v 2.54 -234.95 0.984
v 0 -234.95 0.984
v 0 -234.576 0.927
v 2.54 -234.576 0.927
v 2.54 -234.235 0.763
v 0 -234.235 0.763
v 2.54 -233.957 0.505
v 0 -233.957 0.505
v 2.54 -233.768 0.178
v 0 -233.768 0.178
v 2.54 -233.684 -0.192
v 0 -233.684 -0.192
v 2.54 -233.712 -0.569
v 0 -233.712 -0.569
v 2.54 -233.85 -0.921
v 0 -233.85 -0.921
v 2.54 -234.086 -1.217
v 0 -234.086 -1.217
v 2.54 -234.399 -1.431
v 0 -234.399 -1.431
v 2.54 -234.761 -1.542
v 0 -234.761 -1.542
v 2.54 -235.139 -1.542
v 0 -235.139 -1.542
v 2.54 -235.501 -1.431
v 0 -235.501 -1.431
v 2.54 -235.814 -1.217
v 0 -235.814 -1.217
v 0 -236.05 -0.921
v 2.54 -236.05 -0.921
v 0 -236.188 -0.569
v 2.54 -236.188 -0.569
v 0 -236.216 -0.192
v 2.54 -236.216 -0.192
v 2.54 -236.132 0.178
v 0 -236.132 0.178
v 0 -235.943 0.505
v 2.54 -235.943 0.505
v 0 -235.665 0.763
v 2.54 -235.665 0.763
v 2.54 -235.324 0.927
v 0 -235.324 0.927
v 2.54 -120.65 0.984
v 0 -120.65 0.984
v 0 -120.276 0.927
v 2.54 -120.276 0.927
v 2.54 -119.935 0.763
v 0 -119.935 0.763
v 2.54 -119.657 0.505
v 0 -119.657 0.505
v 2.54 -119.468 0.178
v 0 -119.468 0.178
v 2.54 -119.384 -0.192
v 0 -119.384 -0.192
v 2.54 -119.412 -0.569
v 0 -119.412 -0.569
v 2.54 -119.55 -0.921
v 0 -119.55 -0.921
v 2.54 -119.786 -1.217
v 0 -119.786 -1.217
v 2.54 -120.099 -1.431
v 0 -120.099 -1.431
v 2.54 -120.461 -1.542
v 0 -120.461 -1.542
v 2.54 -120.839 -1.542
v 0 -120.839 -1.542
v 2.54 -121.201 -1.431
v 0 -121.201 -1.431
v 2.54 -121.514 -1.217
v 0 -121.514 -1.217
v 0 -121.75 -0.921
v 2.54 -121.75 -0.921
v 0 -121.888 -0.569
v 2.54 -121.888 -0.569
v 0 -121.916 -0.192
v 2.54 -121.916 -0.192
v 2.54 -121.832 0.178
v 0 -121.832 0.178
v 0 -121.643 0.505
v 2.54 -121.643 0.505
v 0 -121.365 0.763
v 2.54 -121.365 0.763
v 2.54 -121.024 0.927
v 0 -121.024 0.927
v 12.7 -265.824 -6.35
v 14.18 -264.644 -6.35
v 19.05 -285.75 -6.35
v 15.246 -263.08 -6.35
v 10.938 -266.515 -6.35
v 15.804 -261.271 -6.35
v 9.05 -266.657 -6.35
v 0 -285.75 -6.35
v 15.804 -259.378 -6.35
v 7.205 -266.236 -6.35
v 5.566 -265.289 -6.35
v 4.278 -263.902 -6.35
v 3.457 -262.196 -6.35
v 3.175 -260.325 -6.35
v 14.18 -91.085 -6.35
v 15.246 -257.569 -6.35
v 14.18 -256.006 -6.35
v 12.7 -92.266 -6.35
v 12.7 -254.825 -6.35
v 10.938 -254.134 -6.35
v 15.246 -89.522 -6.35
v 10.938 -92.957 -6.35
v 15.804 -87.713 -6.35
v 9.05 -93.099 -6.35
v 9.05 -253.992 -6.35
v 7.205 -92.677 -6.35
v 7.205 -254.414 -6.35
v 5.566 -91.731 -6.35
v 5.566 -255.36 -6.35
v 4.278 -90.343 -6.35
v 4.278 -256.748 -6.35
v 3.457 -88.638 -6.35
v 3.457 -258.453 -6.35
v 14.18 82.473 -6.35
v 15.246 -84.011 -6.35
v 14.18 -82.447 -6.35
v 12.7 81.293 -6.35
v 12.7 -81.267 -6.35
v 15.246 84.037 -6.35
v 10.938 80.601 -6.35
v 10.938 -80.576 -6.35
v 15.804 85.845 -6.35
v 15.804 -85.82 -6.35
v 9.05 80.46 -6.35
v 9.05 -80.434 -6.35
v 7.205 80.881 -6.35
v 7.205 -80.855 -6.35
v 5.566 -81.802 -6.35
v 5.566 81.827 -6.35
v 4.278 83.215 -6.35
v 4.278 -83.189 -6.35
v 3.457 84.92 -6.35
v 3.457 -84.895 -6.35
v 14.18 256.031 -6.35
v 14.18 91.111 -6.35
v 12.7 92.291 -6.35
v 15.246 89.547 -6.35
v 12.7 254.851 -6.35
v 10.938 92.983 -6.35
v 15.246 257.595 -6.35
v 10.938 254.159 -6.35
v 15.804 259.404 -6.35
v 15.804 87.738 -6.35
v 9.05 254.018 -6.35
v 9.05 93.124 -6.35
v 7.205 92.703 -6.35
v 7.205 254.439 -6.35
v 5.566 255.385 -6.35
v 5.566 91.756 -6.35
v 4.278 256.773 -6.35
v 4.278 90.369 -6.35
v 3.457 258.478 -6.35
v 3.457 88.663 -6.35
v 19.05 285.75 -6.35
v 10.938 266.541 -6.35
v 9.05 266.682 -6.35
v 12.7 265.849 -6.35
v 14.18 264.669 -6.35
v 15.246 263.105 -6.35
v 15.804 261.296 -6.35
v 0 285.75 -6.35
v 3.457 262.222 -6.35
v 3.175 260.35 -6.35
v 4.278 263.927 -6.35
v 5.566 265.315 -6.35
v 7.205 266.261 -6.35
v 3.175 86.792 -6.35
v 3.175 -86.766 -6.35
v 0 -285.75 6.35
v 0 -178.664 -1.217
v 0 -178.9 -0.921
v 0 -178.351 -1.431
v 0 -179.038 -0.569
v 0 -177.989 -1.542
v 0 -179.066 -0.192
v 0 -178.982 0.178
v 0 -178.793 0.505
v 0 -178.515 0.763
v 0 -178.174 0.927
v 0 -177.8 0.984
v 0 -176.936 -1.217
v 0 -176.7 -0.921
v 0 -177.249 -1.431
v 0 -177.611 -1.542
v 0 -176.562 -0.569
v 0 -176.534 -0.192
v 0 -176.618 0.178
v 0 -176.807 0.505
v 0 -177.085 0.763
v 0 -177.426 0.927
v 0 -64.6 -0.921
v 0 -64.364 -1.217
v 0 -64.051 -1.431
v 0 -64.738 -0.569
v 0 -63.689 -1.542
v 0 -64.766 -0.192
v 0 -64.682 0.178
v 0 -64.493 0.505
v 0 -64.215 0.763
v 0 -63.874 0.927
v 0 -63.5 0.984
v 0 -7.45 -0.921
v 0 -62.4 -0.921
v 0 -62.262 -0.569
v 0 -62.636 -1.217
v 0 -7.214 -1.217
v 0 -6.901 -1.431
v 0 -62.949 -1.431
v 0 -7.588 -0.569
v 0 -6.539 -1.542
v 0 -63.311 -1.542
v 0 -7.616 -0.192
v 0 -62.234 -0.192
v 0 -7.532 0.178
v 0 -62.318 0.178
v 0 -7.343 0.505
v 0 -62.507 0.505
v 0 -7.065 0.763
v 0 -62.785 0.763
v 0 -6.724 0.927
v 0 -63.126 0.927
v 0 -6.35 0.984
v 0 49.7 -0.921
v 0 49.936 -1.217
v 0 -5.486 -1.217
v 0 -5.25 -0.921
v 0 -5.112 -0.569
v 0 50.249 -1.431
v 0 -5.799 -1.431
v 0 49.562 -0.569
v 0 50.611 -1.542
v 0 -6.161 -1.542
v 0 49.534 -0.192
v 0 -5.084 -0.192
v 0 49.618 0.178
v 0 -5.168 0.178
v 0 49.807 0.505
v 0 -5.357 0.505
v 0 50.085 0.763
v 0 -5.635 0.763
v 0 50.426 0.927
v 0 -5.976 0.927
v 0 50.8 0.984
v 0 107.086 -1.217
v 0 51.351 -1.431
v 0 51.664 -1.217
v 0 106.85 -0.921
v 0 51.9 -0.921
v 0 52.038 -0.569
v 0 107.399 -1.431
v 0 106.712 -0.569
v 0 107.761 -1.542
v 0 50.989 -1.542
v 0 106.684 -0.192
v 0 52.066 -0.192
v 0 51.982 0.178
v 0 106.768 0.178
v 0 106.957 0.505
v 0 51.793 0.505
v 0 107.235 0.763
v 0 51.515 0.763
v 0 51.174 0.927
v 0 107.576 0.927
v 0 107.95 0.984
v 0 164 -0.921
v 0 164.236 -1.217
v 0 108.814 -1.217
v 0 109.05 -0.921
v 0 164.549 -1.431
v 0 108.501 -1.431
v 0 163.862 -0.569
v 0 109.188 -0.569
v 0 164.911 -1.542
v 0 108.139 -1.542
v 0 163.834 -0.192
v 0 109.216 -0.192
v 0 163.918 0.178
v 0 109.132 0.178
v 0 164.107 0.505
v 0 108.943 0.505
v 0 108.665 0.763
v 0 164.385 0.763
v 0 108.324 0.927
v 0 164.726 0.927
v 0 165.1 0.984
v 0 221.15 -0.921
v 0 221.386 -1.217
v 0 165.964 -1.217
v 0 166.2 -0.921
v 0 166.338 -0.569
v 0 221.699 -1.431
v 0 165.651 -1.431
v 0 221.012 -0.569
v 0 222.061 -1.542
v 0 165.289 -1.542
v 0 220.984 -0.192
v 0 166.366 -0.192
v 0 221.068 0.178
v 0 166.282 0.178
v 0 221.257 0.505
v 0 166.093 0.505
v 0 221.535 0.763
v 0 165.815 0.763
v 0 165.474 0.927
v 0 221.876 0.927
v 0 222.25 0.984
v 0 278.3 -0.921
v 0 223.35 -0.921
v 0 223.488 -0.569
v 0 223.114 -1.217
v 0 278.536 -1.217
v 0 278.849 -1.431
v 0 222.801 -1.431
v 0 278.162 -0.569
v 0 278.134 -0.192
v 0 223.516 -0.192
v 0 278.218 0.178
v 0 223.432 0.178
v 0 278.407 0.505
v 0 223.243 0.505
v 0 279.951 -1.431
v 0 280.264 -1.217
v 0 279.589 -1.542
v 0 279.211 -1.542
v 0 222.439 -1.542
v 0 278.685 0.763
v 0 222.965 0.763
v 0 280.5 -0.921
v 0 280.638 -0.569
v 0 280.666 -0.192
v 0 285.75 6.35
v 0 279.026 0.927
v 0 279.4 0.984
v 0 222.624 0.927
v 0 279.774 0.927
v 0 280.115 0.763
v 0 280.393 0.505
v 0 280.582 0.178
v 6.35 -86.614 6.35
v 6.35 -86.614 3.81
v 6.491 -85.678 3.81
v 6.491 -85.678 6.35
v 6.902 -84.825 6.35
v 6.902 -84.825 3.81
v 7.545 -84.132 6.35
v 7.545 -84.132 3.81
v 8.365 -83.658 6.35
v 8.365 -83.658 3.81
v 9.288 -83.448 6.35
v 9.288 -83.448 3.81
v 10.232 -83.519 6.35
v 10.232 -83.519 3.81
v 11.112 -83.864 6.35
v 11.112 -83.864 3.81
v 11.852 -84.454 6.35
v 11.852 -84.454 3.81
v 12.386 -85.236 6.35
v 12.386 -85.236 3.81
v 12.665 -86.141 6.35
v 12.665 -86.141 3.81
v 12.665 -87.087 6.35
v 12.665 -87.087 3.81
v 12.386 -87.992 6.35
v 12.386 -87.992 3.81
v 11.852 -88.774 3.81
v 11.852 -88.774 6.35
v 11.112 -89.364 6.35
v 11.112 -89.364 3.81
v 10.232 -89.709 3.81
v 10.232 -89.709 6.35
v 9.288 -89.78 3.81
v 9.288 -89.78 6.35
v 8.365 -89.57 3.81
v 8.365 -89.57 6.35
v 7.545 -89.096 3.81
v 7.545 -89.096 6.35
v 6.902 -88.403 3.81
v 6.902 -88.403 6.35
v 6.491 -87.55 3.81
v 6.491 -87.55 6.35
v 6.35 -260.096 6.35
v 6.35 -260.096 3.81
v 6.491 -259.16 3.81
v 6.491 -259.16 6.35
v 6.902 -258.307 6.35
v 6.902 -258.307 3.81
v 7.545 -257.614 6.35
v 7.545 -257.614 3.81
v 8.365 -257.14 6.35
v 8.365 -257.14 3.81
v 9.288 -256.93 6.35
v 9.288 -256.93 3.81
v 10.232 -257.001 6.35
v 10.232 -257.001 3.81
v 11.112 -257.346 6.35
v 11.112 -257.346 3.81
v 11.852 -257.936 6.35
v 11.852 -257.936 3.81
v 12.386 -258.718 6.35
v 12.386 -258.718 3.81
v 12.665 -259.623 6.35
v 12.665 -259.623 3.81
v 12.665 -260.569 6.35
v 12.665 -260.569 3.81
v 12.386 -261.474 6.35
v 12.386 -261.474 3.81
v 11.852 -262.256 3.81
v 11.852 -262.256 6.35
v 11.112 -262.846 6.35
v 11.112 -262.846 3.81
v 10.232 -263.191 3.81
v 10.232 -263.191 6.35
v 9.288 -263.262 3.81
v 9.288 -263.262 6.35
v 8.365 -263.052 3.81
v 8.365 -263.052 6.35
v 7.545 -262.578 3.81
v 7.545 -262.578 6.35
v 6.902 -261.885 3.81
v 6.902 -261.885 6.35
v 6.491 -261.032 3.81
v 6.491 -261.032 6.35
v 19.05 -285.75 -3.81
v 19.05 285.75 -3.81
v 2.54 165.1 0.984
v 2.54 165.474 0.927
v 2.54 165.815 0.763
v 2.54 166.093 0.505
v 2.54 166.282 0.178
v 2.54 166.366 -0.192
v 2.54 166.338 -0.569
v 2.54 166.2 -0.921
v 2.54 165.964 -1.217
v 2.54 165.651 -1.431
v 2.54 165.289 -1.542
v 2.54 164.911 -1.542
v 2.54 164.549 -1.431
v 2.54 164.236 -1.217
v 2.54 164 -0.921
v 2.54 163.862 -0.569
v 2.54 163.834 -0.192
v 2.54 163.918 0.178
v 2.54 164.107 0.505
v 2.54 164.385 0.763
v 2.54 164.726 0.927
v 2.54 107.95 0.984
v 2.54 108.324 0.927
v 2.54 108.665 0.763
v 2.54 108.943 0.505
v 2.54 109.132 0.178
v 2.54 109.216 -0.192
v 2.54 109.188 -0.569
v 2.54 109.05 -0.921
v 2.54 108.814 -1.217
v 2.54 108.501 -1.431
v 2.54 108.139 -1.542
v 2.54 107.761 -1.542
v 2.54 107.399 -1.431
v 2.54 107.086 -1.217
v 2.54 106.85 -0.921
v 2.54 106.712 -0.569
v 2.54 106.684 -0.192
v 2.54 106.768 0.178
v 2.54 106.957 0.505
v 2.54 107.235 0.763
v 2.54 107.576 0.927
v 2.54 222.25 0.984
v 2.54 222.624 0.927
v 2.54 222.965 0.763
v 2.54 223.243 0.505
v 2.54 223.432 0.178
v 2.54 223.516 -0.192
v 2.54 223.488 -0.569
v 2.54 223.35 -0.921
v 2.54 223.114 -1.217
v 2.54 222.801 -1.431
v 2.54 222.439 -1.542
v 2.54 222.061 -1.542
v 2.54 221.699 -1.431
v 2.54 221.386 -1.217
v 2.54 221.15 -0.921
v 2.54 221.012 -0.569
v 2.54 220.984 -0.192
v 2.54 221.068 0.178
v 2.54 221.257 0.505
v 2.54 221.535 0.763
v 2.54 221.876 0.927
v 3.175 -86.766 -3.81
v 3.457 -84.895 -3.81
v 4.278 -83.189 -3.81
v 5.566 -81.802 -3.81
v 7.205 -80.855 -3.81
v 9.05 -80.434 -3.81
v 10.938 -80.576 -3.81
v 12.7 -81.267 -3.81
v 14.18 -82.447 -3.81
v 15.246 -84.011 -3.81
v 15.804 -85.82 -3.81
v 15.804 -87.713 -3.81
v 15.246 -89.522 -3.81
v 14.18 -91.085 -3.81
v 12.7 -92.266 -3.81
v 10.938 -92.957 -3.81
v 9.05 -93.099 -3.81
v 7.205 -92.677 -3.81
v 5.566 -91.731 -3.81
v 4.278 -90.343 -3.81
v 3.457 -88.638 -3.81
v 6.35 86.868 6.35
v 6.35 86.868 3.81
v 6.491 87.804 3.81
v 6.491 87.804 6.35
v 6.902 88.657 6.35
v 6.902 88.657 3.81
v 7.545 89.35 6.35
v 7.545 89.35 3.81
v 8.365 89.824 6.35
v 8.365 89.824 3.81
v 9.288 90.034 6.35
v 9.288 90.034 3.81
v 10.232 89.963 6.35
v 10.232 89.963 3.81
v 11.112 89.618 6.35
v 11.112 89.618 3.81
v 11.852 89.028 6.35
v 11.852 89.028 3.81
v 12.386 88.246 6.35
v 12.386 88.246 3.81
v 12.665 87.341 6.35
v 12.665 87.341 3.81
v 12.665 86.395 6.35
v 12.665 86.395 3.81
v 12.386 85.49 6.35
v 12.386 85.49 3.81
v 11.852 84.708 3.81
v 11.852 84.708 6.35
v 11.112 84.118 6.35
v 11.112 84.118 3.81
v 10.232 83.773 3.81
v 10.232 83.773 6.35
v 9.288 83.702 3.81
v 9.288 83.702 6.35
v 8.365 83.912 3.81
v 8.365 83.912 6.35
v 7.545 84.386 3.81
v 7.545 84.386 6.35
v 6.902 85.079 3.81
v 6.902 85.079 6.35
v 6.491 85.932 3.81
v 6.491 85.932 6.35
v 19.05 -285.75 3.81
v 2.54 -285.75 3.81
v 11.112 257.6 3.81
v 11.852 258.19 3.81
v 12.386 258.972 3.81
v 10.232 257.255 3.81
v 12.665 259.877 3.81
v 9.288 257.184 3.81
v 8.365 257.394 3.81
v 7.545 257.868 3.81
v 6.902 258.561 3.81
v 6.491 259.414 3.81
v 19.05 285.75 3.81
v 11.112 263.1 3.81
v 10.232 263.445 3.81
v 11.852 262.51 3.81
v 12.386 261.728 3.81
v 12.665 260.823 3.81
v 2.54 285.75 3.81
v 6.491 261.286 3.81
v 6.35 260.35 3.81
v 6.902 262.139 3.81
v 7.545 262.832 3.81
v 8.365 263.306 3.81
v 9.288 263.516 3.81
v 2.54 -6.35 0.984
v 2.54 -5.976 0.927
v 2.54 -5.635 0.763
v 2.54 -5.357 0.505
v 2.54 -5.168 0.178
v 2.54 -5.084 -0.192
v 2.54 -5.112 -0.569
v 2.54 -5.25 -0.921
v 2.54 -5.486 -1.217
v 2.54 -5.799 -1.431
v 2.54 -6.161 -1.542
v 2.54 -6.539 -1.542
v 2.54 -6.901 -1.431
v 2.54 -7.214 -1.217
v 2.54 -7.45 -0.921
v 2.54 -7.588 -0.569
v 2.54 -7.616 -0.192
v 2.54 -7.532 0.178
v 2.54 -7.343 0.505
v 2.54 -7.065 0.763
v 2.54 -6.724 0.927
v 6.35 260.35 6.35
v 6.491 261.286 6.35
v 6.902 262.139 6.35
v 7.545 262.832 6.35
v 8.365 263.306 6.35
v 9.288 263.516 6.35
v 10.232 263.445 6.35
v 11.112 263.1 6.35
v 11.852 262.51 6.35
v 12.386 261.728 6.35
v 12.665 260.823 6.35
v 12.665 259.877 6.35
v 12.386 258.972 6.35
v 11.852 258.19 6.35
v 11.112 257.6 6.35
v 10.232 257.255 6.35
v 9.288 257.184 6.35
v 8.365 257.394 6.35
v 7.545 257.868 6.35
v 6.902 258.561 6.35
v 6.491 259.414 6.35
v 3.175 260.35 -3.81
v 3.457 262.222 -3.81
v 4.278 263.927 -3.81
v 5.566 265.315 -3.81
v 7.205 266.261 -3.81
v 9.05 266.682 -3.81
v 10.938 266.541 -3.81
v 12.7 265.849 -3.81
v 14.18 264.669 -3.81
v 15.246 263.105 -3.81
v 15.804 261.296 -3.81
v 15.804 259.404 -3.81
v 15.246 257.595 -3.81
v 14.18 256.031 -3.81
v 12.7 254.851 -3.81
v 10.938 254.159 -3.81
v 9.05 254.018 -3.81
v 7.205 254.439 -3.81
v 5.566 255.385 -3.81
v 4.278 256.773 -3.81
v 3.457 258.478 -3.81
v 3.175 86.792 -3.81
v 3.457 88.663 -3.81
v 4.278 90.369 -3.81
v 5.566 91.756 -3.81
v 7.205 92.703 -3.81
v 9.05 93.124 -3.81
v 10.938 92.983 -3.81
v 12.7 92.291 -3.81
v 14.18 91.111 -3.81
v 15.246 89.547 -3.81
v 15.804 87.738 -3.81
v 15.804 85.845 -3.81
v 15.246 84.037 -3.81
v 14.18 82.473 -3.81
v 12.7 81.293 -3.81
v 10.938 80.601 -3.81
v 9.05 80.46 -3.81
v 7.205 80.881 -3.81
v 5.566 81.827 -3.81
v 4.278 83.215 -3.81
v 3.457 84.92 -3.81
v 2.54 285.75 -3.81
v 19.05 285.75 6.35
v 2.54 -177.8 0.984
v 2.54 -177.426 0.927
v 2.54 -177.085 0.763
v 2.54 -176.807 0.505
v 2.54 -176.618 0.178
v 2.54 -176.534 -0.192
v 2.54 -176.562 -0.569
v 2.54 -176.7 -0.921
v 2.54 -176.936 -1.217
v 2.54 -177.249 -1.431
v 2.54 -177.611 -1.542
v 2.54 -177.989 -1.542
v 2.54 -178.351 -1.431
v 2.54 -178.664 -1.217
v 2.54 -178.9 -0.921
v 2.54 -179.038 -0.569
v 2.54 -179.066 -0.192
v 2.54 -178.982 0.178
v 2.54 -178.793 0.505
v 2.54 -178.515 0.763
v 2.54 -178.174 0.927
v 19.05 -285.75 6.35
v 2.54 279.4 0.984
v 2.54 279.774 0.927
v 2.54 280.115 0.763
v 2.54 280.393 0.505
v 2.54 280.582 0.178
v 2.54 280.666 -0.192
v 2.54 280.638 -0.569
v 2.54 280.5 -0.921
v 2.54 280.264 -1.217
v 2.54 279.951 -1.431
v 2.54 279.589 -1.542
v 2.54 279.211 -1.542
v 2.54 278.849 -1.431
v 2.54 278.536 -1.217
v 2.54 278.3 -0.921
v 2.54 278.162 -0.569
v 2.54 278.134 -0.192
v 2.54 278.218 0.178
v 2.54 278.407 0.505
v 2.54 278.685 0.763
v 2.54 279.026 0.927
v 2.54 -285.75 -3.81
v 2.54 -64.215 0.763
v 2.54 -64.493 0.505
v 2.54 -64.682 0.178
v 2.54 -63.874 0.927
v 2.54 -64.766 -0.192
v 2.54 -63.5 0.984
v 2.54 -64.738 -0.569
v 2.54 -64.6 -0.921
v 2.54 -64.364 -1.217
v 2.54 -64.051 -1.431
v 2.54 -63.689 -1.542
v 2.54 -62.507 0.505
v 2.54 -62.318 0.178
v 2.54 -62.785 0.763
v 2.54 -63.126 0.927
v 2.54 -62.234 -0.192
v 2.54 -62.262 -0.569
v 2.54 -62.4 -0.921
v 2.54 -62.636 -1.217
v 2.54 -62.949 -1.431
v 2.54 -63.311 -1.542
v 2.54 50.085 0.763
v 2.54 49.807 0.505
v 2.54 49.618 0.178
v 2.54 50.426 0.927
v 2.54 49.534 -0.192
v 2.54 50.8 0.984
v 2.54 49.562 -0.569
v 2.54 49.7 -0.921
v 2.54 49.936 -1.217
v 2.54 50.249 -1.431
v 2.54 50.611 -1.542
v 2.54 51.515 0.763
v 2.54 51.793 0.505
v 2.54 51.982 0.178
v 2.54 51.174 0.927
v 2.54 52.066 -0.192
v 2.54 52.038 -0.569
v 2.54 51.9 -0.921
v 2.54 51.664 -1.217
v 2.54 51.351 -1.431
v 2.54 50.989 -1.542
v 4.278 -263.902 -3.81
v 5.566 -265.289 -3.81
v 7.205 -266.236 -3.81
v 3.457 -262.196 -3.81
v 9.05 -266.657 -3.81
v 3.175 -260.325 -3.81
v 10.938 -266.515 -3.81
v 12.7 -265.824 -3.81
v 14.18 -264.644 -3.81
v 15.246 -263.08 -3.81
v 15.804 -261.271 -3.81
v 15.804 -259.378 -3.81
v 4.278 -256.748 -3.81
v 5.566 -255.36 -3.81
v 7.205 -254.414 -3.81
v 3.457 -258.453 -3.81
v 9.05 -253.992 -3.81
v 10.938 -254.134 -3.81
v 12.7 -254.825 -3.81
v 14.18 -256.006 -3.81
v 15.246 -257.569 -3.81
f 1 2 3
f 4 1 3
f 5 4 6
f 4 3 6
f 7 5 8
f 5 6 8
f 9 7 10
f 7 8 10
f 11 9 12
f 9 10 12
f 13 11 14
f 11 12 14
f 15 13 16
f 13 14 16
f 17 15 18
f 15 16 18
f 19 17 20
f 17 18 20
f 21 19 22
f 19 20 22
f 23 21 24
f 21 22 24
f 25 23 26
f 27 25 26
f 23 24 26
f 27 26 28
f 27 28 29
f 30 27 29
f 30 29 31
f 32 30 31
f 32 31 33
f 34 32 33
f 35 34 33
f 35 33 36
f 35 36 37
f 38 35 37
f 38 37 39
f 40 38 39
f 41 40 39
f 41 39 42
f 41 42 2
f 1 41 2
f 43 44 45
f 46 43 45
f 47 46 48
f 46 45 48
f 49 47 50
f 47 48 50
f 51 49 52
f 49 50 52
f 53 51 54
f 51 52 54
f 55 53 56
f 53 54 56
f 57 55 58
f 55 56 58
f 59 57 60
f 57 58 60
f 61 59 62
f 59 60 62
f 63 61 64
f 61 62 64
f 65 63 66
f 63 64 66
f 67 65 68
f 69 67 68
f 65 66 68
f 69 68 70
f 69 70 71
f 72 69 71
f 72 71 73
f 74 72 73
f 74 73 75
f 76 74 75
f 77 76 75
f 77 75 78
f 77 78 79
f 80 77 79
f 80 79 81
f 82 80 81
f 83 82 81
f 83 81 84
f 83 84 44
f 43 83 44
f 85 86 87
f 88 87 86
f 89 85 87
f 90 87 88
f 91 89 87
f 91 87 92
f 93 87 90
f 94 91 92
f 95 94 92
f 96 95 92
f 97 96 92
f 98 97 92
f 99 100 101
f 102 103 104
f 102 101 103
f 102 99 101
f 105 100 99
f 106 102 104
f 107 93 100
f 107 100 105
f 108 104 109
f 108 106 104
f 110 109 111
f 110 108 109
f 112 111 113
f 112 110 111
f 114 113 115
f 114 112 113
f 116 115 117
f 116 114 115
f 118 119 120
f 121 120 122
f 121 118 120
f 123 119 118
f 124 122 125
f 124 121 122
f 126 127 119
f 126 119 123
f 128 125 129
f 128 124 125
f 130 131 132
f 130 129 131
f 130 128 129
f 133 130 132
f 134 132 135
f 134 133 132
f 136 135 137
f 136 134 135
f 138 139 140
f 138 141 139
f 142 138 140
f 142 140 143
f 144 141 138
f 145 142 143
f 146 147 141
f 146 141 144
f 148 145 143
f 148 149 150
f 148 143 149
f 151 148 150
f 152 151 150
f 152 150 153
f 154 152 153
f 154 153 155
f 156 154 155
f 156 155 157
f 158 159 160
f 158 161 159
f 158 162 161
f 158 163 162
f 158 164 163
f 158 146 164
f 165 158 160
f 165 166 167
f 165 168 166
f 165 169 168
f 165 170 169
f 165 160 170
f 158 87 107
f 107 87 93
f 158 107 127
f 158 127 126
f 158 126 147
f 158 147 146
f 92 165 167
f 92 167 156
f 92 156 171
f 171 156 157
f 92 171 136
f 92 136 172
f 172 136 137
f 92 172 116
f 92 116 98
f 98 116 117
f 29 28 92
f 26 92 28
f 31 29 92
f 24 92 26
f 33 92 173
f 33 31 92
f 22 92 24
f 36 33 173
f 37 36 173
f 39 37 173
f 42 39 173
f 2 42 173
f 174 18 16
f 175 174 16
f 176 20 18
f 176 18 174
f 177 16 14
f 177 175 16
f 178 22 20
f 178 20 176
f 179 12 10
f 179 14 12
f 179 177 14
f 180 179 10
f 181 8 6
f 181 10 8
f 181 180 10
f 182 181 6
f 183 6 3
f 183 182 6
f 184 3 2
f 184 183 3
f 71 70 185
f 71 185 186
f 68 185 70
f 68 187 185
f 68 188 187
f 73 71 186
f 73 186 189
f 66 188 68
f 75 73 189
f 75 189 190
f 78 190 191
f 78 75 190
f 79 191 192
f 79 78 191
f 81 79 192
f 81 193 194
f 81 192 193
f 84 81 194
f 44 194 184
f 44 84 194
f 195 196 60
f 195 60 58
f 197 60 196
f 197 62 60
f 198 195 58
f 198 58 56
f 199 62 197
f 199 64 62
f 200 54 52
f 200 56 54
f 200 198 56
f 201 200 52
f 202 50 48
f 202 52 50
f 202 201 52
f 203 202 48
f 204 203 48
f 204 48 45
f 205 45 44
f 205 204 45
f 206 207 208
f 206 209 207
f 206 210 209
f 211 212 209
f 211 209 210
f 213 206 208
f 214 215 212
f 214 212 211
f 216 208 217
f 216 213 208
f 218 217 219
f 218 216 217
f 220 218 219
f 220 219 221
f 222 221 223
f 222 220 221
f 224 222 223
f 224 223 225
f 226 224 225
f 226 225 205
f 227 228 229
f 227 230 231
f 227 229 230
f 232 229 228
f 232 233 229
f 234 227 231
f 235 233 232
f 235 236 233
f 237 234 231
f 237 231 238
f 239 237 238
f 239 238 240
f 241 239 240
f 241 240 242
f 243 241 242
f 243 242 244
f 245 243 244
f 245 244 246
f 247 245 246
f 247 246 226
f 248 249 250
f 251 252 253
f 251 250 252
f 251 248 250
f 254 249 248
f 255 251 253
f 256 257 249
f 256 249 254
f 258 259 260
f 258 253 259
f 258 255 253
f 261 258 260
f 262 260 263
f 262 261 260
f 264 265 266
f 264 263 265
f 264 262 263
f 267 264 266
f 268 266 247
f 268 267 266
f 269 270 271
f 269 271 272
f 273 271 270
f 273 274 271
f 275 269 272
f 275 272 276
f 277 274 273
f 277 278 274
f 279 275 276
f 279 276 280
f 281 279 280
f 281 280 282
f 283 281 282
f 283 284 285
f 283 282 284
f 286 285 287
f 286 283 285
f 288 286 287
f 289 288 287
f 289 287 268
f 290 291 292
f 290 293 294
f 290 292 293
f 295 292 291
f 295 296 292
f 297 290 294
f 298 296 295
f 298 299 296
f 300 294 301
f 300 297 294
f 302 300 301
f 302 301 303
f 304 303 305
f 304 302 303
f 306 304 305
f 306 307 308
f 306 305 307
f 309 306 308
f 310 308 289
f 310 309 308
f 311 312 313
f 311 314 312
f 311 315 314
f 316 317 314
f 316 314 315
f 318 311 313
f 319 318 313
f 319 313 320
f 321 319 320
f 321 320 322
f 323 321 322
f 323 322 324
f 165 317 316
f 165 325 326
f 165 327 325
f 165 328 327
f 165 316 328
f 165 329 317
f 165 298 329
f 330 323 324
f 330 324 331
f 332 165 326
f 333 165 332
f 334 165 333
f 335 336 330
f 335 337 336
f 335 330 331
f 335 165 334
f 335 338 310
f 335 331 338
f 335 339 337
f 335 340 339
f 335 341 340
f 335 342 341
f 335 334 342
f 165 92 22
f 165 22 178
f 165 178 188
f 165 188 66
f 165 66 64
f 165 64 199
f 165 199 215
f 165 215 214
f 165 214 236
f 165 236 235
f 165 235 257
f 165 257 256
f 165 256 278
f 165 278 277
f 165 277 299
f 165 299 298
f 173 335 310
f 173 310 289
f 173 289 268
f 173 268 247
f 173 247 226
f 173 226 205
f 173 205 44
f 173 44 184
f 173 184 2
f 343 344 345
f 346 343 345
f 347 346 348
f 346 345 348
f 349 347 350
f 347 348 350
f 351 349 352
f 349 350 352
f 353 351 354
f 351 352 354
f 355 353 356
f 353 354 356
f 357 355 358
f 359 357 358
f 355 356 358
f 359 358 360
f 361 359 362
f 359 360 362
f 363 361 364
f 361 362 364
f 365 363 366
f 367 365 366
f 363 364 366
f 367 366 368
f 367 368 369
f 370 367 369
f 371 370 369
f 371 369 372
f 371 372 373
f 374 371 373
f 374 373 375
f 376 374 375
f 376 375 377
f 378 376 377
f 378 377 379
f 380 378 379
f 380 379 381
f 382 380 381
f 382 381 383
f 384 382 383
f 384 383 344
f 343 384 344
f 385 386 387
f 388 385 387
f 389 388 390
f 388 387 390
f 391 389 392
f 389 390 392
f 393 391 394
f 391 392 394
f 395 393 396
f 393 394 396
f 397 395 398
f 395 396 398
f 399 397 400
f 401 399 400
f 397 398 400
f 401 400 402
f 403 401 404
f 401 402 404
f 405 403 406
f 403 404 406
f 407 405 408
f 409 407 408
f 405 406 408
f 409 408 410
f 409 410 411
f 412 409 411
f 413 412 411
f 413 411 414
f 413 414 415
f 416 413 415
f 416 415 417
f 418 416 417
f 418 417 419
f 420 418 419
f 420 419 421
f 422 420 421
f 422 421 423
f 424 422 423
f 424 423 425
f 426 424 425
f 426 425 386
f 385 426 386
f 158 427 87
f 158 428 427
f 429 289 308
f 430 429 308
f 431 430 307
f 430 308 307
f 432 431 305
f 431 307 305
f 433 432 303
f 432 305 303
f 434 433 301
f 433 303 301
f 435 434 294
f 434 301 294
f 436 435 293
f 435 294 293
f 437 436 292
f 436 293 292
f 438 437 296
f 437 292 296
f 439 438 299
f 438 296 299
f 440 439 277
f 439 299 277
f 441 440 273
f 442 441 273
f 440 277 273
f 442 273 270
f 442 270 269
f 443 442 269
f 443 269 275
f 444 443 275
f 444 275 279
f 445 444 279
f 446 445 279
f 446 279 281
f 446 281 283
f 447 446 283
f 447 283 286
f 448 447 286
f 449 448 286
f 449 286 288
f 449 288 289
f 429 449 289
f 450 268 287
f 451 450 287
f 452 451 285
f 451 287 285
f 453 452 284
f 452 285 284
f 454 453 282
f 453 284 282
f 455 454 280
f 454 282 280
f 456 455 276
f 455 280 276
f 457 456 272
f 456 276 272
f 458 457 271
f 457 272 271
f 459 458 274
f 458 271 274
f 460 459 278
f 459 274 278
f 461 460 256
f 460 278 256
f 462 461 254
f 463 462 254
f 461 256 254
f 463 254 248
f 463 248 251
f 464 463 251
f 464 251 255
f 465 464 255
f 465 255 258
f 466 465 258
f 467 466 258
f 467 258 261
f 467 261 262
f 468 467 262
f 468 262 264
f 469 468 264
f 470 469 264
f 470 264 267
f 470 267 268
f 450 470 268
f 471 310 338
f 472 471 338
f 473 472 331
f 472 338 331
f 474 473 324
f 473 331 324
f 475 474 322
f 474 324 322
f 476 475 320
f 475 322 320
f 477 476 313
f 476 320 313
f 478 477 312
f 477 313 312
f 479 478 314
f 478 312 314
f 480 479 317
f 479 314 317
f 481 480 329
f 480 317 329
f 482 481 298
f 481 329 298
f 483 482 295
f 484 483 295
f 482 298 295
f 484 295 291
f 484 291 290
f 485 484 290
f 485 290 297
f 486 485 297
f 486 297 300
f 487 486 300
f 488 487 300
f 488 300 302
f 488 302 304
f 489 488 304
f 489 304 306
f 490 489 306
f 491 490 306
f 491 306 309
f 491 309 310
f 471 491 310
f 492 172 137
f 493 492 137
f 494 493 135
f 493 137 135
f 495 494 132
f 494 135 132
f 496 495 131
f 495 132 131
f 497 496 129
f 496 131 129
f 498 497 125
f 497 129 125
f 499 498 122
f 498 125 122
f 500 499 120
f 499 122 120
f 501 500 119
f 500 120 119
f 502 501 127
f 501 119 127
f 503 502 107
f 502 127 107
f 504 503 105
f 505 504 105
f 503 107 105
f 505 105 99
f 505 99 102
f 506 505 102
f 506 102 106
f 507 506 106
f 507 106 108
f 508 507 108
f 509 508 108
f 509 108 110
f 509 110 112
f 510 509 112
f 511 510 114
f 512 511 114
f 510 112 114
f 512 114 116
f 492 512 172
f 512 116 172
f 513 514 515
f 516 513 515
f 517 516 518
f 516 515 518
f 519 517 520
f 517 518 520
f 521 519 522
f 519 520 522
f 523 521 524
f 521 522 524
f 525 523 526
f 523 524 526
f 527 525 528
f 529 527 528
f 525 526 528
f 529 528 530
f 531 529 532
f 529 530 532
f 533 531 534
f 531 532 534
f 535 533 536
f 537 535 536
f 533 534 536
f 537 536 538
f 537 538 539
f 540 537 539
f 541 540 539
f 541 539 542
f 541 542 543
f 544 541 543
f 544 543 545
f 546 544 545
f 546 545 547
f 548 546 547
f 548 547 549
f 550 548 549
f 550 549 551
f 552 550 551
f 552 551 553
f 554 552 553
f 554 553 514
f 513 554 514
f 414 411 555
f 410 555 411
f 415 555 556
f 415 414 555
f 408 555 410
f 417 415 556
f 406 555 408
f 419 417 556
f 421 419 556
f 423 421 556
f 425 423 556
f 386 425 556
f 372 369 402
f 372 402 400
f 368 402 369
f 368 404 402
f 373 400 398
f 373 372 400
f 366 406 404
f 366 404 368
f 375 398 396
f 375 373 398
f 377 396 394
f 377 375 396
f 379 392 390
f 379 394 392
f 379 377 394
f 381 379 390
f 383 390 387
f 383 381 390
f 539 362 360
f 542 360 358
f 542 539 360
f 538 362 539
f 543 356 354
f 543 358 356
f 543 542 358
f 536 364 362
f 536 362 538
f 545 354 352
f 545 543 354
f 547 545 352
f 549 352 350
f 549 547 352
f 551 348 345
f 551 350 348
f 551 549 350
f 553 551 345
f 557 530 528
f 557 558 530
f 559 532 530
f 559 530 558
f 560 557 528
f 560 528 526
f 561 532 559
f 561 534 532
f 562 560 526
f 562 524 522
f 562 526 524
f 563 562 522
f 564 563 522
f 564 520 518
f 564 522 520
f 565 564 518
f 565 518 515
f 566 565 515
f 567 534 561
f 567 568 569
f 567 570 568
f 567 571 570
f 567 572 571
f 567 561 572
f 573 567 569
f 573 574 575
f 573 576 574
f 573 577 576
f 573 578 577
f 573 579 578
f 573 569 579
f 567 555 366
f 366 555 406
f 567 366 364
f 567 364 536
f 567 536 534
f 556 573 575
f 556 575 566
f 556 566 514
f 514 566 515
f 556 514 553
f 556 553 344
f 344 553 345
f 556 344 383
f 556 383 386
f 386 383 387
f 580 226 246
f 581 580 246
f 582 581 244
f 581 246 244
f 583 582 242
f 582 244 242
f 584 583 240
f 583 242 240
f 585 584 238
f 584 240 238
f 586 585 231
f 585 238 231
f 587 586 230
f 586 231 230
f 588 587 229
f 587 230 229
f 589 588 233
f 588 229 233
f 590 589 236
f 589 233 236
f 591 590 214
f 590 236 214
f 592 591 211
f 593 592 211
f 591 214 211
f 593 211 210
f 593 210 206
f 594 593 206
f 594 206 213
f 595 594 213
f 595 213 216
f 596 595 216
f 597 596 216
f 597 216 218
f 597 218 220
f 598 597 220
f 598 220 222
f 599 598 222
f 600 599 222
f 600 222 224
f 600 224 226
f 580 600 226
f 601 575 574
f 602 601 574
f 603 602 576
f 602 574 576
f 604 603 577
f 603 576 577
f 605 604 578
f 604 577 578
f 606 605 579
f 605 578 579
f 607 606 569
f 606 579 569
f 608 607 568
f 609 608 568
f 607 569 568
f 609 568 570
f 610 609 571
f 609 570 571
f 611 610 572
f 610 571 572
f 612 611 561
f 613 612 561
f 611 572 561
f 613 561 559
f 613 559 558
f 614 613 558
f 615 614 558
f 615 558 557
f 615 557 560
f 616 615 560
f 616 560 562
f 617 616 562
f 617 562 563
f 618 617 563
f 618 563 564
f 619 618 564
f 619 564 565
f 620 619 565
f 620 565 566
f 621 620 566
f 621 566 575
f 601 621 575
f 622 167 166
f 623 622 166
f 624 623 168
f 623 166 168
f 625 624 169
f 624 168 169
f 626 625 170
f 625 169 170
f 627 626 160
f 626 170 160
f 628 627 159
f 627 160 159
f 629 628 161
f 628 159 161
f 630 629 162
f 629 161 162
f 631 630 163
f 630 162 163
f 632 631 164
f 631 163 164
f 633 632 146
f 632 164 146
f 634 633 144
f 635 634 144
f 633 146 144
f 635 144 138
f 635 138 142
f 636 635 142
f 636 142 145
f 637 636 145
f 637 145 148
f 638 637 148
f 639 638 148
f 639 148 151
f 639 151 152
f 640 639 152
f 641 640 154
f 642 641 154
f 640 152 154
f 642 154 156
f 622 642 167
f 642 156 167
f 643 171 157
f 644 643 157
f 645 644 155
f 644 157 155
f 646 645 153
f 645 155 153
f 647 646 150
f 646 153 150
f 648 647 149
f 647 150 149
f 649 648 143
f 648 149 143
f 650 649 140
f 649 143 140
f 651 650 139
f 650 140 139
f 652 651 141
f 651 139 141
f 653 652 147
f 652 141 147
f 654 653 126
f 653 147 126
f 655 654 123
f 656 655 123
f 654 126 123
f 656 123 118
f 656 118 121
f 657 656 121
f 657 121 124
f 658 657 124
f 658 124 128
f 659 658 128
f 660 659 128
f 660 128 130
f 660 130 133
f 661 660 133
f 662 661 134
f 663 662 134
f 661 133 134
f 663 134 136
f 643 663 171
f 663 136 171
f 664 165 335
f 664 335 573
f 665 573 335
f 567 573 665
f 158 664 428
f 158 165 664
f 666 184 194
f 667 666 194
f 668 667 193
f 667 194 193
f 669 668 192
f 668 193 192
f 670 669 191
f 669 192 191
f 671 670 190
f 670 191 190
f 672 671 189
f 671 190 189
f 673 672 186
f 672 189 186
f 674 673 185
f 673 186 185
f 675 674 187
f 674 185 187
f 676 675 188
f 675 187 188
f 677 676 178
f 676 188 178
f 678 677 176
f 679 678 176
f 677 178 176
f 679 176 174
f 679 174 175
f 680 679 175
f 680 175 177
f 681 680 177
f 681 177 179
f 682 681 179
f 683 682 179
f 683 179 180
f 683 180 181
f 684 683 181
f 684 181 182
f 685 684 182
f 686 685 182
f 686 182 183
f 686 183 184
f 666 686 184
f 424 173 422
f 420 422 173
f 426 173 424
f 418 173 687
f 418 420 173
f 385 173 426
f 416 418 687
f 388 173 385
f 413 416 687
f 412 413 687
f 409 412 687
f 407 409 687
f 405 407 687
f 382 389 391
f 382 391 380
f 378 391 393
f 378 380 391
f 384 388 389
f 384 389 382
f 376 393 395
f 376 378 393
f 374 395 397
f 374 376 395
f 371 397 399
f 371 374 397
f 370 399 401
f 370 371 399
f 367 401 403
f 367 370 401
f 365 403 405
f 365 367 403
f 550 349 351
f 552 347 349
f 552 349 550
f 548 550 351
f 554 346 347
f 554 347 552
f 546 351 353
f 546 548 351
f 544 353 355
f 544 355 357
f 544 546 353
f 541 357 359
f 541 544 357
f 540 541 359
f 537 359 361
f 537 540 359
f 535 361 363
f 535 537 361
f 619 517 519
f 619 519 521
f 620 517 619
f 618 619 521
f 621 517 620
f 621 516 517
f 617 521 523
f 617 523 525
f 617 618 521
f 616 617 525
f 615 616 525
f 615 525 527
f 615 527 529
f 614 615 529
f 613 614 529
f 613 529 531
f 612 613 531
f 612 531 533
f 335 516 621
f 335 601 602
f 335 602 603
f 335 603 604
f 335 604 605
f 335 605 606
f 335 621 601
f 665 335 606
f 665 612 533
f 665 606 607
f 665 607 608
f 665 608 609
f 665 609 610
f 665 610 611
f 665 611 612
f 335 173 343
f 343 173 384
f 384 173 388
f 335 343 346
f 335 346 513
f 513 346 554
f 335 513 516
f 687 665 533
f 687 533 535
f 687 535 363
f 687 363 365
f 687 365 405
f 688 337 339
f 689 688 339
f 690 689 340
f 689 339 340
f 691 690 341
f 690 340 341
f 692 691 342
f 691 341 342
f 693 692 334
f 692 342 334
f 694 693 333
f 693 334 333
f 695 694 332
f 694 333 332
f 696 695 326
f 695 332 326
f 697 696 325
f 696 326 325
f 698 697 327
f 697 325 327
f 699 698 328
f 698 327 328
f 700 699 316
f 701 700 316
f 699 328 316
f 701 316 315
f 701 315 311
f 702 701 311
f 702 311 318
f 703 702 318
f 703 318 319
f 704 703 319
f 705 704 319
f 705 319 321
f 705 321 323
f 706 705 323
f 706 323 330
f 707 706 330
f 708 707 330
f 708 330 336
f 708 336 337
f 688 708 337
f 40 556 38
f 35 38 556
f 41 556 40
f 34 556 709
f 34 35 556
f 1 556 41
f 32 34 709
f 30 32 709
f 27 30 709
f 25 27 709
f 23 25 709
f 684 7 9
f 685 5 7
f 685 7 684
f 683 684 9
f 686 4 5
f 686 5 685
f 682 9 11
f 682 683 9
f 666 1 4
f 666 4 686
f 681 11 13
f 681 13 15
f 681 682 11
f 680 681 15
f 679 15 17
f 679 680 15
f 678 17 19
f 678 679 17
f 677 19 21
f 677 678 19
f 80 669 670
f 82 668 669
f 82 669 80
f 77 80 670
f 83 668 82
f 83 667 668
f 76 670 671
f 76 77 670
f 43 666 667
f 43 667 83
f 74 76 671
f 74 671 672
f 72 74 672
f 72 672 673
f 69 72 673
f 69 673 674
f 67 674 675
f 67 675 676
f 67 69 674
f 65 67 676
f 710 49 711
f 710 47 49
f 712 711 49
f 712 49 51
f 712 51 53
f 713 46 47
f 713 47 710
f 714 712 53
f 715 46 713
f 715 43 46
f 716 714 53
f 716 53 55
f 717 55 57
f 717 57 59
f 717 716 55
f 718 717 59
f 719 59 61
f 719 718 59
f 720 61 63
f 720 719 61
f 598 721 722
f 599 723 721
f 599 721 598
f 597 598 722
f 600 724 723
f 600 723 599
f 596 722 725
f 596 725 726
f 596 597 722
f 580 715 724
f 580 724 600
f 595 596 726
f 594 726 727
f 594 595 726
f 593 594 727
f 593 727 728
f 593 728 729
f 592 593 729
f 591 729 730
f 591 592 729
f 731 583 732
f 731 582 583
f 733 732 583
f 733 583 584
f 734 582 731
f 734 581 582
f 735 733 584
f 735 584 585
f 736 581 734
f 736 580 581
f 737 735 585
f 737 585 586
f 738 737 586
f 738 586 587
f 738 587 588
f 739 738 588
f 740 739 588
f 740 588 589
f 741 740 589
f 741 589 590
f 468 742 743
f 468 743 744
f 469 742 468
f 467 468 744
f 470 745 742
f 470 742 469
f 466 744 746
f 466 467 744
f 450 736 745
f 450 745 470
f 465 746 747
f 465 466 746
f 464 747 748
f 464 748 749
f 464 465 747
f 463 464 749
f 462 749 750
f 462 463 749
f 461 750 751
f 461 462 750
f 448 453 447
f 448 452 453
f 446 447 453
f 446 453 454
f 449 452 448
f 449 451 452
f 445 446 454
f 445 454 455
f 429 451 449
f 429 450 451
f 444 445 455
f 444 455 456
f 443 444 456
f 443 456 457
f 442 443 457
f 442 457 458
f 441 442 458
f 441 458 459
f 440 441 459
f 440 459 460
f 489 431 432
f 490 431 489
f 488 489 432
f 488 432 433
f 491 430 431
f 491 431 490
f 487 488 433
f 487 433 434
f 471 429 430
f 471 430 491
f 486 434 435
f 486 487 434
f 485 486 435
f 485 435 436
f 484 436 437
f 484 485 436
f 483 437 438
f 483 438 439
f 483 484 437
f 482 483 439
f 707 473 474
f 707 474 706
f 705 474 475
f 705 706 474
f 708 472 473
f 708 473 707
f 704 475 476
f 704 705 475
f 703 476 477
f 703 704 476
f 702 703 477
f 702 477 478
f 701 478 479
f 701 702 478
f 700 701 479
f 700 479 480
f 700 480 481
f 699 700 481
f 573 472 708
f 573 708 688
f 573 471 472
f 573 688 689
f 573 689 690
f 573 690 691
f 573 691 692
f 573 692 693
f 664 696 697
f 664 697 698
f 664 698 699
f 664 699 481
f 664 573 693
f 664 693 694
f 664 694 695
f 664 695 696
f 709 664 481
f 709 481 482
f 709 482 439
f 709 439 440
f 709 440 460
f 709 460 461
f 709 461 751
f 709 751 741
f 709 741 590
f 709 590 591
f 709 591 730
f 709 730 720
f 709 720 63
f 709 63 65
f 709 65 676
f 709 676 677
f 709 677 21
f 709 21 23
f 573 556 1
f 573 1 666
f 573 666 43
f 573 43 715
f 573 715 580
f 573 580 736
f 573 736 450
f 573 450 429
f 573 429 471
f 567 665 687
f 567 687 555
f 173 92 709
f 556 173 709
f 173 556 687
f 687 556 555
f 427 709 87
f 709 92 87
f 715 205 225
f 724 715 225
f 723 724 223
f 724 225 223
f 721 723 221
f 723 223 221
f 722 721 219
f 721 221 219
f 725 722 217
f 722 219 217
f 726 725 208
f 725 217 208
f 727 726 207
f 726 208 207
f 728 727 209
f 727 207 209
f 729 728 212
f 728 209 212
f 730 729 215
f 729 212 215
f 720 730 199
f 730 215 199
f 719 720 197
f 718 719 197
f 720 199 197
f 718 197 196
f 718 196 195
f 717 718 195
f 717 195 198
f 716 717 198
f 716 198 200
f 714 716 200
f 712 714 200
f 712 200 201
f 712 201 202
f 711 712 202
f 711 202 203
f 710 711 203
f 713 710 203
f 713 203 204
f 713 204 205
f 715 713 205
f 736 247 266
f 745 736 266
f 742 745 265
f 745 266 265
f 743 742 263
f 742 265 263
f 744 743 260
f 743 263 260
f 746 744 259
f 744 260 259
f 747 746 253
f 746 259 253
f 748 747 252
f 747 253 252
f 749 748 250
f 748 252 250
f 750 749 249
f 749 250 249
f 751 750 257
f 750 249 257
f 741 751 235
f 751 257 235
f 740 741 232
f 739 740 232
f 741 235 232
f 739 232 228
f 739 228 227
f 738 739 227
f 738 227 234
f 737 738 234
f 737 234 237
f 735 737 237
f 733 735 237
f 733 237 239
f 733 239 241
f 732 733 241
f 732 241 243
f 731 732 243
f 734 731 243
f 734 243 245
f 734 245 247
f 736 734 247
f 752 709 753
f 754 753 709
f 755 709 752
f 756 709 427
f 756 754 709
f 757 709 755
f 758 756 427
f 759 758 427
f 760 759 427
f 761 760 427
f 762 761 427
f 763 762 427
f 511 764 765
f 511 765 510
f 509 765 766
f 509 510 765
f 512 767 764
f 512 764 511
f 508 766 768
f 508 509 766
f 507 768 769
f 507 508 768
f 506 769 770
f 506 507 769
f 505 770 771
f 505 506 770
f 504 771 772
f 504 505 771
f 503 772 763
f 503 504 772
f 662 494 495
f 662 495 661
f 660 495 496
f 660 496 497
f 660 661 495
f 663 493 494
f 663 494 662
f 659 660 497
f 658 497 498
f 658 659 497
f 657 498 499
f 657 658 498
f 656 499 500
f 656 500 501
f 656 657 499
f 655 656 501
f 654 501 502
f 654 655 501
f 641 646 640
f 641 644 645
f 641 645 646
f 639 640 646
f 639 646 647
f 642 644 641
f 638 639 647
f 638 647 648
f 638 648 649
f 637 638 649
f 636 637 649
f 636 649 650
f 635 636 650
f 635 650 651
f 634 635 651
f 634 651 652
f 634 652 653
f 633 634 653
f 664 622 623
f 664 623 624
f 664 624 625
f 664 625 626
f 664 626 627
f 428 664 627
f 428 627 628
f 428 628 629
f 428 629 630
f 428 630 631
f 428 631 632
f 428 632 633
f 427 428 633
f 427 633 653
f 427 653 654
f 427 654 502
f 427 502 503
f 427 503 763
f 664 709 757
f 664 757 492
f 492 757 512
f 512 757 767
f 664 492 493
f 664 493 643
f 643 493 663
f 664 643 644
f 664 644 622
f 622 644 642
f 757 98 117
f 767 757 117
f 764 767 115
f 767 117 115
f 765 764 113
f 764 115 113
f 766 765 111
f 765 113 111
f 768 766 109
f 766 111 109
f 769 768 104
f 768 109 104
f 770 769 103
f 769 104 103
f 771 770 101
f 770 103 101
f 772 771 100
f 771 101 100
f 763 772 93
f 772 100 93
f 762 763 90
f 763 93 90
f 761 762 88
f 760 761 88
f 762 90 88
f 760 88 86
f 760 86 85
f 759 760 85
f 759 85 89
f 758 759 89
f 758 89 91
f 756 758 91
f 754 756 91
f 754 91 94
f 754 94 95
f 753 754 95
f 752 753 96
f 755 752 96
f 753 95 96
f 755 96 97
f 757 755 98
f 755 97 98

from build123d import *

# Parameters (mm, degrees)
BOSS_EXTRUDE1_DEPTH = 285.75
SKETCH2_R           = 1.27
CUT_EXTRUDE1_DEPTH  = 20.05
SKETCH4_R           = 3.175
CUT_EXTRUDE2_DEPTH  = 140.208
SKETCH5_R           = 6.35
CUT_EXTRUDE3_DEPTH  = 2.54


with BuildPart() as part:
    # Sketch1 → Boss-Extrude1 (new body, symmetric)
    with BuildSketch(Plane(origin=(0, 0, 0), x_dir=(1, 0, 0), z_dir=(0, 1, 0))):
        Polygon((19.05, 3.81), (19.05, 6.35), (0, 6.35), (0, -6.35), (19.05, -6.35), (19.05, -3.81), (2.54, -3.81), (2.54, 3.81), align=None)
    extrude(amount=BOSS_EXTRUDE1_DEPTH, both=True)

    # Sketch2 → Cut-Extrude1 (cut, through all)
    with BuildSketch(Plane.ZY):
        with Locations((-0.286445318, 279.4)):
            Circle(SKETCH2_R)
        with Locations((-0.286445318, 222.25)):
            Circle(SKETCH2_R)
        with Locations((-0.286445318, 165.1)):
            Circle(SKETCH2_R)
        with Locations((-0.286445318, 107.95)):
            Circle(SKETCH2_R)
        with Locations((-0.286445318, 50.8)):
            Circle(SKETCH2_R)
        with Locations((-0.286445318, -6.35)):
            Circle(SKETCH2_R)
        with Locations((-0.286445318, -63.5)):
            Circle(SKETCH2_R)
        with Locations((-0.286445318, -120.65)):
            Circle(SKETCH2_R)
        with Locations((-0.286445318, -177.8)):
            Circle(SKETCH2_R)
        with Locations((-0.286445318, -234.95)):
            Circle(SKETCH2_R)
    extrude(amount=-CUT_EXTRUDE1_DEPTH, mode=Mode.SUBTRACT)

    # Sketch4 → Cut-Extrude2 (cut)
    with BuildSketch(Plane(origin=(0, 0, 3.81), x_dir=(-1, 0, 0), z_dir=(0, 0, -1))):
        with Locations((-9.525, 260.35)):
            Circle(SKETCH4_R)
        with Locations((-9.525, 86.868)):
            Circle(SKETCH4_R)
        with Locations((-9.525, -86.614)):
            Circle(SKETCH4_R)
        with Locations((-9.525, -260.096)):
            Circle(SKETCH4_R)
    extrude(amount=-CUT_EXTRUDE2_DEPTH, mode=Mode.SUBTRACT)

    # Sketch5 → Cut-Extrude3 (cut)
    with BuildSketch(Plane(origin=(0, 0, -6.35), x_dir=(-1, 0, 0), z_dir=(0, 0, -1))):
        with Locations((-9.525, 260.35)):
            Circle(SKETCH5_R)
        with Locations((-9.525, 86.7918)):
            Circle(SKETCH5_R)
        with Locations((-9.525, -86.7664)):
            Circle(SKETCH5_R)
        with Locations((-9.525, -260.3246)):
            Circle(SKETCH5_R)
    extrude(amount=-CUT_EXTRUDE3_DEPTH, mode=Mode.SUBTRACT)


solid = part.part
